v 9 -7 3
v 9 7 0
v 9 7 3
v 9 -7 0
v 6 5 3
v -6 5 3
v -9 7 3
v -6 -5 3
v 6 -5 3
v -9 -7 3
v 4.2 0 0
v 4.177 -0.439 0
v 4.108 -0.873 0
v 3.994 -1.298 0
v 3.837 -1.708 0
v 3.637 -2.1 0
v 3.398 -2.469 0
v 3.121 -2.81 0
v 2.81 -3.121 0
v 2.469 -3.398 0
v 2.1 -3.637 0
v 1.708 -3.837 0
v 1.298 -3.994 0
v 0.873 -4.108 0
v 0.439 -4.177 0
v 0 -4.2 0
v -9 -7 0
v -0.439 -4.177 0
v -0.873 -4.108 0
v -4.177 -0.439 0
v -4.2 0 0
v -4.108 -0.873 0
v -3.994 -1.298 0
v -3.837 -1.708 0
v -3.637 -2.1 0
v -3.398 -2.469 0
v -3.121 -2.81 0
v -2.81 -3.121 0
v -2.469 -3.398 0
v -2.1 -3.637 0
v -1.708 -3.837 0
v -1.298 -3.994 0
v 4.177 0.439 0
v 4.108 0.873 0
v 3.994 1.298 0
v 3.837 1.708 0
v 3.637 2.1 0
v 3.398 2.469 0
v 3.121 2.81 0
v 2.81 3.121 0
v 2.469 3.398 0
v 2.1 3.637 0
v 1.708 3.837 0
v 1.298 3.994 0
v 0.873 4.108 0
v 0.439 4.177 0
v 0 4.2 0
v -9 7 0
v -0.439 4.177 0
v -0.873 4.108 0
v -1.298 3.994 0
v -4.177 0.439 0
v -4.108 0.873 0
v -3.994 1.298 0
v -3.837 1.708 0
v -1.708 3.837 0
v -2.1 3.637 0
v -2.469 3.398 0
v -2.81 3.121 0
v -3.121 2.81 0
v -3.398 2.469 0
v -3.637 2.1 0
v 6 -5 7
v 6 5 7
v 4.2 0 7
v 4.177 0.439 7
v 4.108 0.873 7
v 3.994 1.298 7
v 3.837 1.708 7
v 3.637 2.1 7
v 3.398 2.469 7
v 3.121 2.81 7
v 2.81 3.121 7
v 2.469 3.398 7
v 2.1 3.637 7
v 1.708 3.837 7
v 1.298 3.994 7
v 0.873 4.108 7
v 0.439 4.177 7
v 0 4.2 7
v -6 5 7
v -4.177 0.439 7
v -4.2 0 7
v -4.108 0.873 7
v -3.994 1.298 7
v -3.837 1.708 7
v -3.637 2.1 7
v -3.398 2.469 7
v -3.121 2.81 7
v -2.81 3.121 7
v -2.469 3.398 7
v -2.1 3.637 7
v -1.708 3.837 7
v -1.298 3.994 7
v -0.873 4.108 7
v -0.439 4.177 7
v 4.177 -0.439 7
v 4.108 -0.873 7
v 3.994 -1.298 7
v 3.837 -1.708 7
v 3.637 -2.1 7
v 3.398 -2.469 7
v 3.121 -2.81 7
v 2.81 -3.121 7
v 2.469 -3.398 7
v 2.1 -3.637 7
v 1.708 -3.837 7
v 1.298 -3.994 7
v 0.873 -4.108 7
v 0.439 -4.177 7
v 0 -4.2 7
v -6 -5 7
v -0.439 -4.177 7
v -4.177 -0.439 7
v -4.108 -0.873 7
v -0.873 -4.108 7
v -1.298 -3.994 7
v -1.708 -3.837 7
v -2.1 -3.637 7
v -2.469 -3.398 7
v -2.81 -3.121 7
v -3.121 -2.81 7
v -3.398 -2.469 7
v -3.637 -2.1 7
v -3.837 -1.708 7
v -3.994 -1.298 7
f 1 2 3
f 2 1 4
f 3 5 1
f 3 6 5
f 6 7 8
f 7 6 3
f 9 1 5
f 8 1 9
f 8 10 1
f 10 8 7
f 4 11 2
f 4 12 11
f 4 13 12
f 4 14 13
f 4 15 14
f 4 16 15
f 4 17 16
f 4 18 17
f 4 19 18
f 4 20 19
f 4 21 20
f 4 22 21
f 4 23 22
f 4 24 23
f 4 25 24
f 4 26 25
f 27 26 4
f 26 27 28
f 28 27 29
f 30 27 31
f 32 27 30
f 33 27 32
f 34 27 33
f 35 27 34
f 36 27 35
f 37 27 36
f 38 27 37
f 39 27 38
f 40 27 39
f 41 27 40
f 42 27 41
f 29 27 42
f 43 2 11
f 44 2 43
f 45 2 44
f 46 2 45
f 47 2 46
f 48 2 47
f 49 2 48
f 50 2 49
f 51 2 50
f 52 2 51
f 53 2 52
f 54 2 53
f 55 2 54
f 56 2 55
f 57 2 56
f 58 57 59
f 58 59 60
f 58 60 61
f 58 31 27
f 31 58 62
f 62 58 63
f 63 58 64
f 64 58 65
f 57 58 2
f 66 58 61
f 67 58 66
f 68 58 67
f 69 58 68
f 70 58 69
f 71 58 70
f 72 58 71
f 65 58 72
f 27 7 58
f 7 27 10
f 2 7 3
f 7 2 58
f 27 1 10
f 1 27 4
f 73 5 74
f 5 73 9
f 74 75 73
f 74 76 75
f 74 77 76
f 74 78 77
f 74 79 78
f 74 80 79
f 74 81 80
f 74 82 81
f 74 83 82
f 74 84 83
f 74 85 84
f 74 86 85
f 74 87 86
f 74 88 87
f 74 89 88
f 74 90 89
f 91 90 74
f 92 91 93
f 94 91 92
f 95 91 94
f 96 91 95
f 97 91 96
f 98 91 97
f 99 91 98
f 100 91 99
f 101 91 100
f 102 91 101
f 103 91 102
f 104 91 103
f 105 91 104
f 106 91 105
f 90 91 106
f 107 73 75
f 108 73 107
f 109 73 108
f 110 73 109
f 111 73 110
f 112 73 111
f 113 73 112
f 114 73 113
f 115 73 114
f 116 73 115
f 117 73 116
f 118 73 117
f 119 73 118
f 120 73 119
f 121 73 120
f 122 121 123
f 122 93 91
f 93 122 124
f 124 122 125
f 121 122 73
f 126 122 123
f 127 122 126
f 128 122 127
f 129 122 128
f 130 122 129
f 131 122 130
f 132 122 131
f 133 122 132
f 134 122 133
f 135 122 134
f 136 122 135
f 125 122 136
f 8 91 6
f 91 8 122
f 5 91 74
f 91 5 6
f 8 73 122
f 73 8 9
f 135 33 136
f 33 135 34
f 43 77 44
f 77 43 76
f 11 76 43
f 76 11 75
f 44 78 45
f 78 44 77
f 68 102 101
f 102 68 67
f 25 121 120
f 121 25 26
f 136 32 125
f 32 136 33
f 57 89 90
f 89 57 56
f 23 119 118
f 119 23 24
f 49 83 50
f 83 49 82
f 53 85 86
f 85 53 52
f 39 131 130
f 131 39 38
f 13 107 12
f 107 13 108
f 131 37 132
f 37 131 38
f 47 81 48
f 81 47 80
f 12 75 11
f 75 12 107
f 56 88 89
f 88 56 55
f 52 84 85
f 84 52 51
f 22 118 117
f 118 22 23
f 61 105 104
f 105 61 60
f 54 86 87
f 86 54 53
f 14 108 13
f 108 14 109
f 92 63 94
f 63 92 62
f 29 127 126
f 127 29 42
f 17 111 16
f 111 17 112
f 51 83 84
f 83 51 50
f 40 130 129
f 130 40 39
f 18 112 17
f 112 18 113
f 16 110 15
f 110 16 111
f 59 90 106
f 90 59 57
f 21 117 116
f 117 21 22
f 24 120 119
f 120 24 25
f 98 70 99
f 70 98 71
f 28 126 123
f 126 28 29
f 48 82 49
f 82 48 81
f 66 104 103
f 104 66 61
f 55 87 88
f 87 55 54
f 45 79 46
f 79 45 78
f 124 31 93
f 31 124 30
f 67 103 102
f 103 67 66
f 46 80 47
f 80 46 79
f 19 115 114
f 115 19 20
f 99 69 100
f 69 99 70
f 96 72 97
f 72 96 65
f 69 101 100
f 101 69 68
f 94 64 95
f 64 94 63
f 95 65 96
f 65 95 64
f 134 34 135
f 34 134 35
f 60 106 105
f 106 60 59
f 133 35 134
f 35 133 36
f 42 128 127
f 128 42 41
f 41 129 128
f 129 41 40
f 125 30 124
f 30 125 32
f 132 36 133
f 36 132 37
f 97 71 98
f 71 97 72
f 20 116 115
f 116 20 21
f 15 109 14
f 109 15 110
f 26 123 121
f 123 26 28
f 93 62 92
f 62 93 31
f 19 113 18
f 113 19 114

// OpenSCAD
// T-slot nut for aluminium extrusion.
$fn = 60;
eps = 0.02;
slot_w = 10;
thread_d = 8.4;
length = 18;
body_w = slot_w + 4;
body_h = 7;
difference() {
    union() {
        translate([-length / 2, -body_w / 2, 0]) cube([length, body_w, 3]);
        translate([-length / 2 + 3, -slot_w / 2, 3]) cube([length - 6, slot_w, body_h - 3]);
    }
    translate([0, 0, -eps]) cylinder(d = thread_d, h = body_h + 2 * eps);
}
